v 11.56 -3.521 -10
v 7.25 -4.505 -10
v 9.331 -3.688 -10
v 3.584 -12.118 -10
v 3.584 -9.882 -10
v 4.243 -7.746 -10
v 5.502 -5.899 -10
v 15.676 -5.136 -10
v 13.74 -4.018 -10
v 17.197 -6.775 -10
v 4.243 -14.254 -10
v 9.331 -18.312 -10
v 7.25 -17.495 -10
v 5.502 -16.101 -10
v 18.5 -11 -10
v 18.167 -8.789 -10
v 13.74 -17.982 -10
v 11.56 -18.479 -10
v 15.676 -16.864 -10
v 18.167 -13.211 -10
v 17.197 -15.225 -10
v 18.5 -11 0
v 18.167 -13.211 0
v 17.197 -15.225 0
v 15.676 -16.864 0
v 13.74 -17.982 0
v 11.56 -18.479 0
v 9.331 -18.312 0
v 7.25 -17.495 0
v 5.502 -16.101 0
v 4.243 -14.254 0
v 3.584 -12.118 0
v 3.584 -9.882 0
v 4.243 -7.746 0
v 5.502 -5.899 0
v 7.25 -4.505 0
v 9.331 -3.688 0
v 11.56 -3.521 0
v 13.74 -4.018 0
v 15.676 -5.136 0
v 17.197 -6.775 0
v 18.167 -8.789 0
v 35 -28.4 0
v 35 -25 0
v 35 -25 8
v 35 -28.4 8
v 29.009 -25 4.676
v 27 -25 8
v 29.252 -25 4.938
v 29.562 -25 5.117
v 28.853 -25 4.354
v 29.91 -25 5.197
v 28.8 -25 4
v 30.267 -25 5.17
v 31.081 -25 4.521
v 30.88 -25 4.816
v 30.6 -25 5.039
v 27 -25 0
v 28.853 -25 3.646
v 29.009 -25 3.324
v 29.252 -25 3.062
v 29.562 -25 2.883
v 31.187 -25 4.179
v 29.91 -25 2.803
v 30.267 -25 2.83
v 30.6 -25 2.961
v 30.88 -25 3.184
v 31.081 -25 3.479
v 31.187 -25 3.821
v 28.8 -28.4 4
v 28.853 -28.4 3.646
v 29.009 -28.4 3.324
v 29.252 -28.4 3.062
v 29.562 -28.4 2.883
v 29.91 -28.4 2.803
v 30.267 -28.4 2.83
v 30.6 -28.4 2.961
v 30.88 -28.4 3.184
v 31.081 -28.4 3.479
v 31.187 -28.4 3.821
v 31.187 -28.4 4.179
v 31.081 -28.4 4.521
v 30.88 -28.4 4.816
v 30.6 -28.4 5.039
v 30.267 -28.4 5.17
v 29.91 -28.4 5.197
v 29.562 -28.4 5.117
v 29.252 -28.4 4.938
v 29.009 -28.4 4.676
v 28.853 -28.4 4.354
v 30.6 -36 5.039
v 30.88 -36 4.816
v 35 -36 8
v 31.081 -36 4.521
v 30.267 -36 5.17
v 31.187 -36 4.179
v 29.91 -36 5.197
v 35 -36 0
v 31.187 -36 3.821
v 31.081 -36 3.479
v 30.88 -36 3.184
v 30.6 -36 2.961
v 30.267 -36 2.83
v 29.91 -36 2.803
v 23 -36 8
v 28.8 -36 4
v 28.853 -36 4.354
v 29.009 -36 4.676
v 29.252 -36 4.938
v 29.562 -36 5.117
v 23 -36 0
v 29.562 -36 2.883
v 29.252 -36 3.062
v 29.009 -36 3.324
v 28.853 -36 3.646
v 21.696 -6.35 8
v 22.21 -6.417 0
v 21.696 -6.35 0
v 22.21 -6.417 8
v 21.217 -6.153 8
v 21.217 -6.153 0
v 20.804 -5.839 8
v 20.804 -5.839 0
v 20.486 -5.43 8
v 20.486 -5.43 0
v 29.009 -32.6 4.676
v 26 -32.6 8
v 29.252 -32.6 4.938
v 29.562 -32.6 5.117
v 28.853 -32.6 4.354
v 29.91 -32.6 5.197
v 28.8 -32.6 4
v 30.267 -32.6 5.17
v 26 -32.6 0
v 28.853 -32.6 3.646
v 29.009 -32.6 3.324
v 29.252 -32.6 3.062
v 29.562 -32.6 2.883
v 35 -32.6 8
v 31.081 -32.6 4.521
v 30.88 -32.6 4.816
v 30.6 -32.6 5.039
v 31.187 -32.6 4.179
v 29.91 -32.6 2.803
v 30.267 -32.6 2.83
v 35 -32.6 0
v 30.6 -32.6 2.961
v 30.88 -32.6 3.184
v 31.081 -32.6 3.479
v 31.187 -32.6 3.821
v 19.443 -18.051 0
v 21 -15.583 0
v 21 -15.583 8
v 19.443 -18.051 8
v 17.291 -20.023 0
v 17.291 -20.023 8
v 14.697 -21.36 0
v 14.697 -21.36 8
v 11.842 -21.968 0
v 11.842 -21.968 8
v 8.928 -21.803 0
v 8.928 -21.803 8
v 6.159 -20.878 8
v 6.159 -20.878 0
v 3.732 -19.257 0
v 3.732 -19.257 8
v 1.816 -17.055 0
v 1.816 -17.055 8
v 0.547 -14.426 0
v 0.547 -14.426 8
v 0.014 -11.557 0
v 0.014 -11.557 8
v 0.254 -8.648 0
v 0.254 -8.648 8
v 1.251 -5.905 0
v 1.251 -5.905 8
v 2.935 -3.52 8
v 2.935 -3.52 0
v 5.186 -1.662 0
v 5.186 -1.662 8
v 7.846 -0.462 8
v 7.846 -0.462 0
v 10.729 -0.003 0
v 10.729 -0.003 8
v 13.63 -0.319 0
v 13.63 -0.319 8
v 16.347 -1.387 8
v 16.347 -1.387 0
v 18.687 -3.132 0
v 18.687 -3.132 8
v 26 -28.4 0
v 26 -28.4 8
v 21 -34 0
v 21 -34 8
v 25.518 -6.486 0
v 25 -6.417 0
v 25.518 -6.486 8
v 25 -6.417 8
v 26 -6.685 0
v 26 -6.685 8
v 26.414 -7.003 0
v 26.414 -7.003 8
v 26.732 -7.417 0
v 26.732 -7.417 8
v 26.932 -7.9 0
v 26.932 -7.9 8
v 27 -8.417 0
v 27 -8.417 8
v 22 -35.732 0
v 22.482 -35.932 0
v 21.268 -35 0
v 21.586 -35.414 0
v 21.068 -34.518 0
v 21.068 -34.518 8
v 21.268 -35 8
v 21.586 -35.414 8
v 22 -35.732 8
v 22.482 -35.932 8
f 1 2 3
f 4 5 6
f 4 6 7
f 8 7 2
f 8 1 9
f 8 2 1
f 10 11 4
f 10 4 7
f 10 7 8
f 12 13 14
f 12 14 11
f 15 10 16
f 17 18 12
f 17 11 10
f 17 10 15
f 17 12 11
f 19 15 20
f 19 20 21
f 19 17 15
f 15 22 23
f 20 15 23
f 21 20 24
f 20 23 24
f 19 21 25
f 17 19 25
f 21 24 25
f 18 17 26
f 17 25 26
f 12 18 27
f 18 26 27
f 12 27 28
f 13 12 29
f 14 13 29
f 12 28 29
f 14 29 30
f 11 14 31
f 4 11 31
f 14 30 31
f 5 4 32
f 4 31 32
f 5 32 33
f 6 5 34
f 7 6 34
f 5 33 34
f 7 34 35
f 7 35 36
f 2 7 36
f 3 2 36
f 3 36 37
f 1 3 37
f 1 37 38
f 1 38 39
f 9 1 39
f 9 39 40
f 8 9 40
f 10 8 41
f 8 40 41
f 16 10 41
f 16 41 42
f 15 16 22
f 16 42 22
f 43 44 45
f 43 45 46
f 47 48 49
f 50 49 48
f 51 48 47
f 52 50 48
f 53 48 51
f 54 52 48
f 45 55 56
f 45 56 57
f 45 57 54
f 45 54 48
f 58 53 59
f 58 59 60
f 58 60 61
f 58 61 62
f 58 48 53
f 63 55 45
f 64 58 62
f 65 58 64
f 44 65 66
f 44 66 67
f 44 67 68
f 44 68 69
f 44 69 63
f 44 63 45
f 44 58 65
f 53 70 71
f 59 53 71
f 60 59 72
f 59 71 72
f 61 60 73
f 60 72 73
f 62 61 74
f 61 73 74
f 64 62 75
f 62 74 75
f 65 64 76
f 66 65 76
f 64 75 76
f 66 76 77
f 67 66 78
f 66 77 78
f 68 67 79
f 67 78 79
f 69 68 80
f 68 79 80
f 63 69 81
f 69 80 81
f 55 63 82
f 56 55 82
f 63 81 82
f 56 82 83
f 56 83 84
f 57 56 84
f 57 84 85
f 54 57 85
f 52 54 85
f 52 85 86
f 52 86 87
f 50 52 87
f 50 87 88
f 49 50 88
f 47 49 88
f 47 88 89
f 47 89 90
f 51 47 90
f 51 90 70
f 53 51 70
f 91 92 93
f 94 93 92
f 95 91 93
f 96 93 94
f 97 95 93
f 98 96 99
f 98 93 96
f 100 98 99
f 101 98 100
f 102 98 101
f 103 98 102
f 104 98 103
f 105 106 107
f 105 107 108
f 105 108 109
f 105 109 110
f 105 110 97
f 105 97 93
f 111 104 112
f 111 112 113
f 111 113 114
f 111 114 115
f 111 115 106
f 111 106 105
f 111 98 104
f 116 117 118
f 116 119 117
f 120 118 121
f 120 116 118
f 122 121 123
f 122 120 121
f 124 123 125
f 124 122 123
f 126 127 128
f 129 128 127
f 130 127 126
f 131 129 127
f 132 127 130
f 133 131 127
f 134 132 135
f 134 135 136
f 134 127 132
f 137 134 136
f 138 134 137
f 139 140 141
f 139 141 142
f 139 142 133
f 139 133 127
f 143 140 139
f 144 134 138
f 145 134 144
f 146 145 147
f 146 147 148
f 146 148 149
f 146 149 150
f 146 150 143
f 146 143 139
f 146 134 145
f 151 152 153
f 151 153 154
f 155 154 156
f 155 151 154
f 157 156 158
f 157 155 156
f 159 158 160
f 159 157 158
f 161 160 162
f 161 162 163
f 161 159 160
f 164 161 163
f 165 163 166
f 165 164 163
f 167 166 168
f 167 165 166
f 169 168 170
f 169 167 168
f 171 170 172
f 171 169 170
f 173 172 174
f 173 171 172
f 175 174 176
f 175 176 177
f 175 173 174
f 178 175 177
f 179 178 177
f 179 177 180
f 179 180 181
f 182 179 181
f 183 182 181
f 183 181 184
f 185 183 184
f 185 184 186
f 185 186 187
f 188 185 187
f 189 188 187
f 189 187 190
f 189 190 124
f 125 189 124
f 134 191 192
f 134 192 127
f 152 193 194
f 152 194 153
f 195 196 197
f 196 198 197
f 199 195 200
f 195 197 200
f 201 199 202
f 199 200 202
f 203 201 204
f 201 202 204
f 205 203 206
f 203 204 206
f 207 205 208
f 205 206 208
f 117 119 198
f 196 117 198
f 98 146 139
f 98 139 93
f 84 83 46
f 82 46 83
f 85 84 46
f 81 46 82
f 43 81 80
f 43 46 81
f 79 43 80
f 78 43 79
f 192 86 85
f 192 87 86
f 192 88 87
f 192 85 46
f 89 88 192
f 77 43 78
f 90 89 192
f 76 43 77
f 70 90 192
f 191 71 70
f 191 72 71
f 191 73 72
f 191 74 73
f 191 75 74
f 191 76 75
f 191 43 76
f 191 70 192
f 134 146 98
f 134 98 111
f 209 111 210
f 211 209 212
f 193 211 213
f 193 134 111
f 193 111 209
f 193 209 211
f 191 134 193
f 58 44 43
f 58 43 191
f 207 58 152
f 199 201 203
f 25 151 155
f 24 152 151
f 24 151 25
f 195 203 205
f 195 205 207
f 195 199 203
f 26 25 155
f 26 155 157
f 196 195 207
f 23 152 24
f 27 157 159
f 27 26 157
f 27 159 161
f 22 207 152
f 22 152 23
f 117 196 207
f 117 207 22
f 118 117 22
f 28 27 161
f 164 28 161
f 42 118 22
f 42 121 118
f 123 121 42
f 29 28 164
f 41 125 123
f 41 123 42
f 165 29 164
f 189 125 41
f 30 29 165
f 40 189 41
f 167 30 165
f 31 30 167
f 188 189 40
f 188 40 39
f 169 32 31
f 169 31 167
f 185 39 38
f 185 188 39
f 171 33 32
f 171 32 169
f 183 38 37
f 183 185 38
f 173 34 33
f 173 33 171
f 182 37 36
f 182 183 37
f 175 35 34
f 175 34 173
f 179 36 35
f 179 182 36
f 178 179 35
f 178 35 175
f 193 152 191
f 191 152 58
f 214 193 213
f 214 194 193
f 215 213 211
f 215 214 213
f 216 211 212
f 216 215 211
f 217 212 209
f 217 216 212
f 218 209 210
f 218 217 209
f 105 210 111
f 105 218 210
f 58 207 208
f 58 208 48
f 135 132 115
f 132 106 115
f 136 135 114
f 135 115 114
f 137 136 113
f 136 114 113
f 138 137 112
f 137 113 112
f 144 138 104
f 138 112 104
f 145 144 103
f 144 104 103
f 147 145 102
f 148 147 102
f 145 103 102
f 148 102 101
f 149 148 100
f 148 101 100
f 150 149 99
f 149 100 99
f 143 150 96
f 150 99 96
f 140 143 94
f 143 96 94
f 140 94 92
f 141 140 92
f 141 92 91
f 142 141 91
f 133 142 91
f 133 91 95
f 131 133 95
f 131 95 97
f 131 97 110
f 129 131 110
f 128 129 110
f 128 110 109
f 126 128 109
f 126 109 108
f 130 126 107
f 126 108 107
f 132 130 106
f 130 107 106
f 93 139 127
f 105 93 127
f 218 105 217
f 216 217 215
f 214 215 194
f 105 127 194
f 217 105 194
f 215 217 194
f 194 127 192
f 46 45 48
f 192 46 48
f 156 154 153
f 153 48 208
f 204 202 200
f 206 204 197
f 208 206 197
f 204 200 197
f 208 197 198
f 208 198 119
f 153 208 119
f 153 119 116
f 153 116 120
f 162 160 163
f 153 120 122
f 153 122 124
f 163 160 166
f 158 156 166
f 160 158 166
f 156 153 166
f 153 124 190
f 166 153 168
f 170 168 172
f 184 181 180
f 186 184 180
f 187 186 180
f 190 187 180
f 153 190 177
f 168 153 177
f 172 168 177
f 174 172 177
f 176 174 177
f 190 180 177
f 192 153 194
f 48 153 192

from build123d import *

# Parameters (mm, degrees)
BOSS_EXTRU_1_DEPTH      = 8
ENL_V_MAT_EXTRU_1_REACH = 45.749
ESQUISSE2_R             = 1
D_GAGEMENT_M21_D        = 2.4
D_GAGEMENT_M21_DEPTH    = 11
D_GAGEMENT_M21_TIP      = 0.721032743
CONG_1_R                = 2
ESQUISSE6_R             = 7.5
BOSS_EXTRU_3_DEPTH      = 10


with BuildPart() as part:
    # Esquisse1 → Boss.-Extru.1 (new body)
    with BuildSketch(Plane.XY):
        with BuildLine():
            Line((21, -6.417424305), (27, -6.417424305))
            Line((27, -6.417424305), (27, -25))
            Line((27, -25), (35, -25))
            Line((35, -25), (35, -28.4))
            Line((35, -28.4), (26, -28.4))
            Line((26, -28.4), (26, -32.6))
            Line((26, -32.6), (35, -32.6))
            Line((35, -32.6), (35, -36))
            Line((35, -36), (21, -36))
            Line((21, -36), (21, -15.582575695))
            ThreePointArc((21, -15.582575695), (0, -11), (21, -6.417424305))
        make_face()
    extrude(amount=BOSS_EXTRU_1_DEPTH)

    # Enlèv. mat.-Extru.1: up to this face of the body (flat: up to its plane)
    enl_v_mat_extru_1_end = Plane(part.part.faces().sort_by_distance((28, -36, 4))[0])
    # Esquisse2 → Enlèv. mat.-Extru.1 (cut, up to the picked face)
    with BuildSketch(Plane(origin=(0, -25, 0), x_dir=(1, 0, 0), z_dir=(0, 1, 0)), mode=Mode.PRIVATE) as enl_v_mat_extru_1_sk1:
        with Locations(Location((30, -4, 0), (0, 0, 270))):
            Circle(ESQUISSE2_R)
    enl_v_mat_extru_1_tool1 = split(extrude(enl_v_mat_extru_1_sk1.sketch, amount=-ENL_V_MAT_EXTRU_1_REACH, mode=Mode.PRIVATE), bisect_by=enl_v_mat_extru_1_end, keep=Keep.BOTH, mode=Mode.PRIVATE)
    add(enl_v_mat_extru_1_tool1.solids().sort_by(Axis((30, -25, 4), (0, -1, 0)))[0], mode=Mode.SUBTRACT)

    # Dégagement M21
    with Locations(Plane(origin=(0, -25, 0), x_dir=(1, 0, 0), z_dir=(0, 1, 0))):
        with Locations((30, -4)):
            Hole(D_GAGEMENT_M21_D / 2, depth=D_GAGEMENT_M21_DEPTH)
            with Locations((0, 0, -(D_GAGEMENT_M21_DEPTH + D_GAGEMENT_M21_TIP / 2))):  # 118° drill point
                Cone(0, D_GAGEMENT_M21_D / 2, D_GAGEMENT_M21_TIP, mode=Mode.SUBTRACT)

    # Congé1
    cong_1_edges = [part.edges().sort_by_distance(p)[0] for p in [
        (21, -36, 4),
        (21, -6.417424305, 4),
        (27, -6.417424305, 4),
    ]]
    fillet(cong_1_edges, radius=CONG_1_R)

    # Esquisse6 → Boss.-Extru.3 (add)
    with BuildSketch(Plane(origin=(0, 0, 0), x_dir=(-1, 0, 0), z_dir=(0, 0, -1))):
        with Locations(Location((-11, -11, 0), (0, 0, 180))):
            Circle(ESQUISSE6_R)
    extrude(amount=BOSS_EXTRU_3_DEPTH)


solid = part.part
